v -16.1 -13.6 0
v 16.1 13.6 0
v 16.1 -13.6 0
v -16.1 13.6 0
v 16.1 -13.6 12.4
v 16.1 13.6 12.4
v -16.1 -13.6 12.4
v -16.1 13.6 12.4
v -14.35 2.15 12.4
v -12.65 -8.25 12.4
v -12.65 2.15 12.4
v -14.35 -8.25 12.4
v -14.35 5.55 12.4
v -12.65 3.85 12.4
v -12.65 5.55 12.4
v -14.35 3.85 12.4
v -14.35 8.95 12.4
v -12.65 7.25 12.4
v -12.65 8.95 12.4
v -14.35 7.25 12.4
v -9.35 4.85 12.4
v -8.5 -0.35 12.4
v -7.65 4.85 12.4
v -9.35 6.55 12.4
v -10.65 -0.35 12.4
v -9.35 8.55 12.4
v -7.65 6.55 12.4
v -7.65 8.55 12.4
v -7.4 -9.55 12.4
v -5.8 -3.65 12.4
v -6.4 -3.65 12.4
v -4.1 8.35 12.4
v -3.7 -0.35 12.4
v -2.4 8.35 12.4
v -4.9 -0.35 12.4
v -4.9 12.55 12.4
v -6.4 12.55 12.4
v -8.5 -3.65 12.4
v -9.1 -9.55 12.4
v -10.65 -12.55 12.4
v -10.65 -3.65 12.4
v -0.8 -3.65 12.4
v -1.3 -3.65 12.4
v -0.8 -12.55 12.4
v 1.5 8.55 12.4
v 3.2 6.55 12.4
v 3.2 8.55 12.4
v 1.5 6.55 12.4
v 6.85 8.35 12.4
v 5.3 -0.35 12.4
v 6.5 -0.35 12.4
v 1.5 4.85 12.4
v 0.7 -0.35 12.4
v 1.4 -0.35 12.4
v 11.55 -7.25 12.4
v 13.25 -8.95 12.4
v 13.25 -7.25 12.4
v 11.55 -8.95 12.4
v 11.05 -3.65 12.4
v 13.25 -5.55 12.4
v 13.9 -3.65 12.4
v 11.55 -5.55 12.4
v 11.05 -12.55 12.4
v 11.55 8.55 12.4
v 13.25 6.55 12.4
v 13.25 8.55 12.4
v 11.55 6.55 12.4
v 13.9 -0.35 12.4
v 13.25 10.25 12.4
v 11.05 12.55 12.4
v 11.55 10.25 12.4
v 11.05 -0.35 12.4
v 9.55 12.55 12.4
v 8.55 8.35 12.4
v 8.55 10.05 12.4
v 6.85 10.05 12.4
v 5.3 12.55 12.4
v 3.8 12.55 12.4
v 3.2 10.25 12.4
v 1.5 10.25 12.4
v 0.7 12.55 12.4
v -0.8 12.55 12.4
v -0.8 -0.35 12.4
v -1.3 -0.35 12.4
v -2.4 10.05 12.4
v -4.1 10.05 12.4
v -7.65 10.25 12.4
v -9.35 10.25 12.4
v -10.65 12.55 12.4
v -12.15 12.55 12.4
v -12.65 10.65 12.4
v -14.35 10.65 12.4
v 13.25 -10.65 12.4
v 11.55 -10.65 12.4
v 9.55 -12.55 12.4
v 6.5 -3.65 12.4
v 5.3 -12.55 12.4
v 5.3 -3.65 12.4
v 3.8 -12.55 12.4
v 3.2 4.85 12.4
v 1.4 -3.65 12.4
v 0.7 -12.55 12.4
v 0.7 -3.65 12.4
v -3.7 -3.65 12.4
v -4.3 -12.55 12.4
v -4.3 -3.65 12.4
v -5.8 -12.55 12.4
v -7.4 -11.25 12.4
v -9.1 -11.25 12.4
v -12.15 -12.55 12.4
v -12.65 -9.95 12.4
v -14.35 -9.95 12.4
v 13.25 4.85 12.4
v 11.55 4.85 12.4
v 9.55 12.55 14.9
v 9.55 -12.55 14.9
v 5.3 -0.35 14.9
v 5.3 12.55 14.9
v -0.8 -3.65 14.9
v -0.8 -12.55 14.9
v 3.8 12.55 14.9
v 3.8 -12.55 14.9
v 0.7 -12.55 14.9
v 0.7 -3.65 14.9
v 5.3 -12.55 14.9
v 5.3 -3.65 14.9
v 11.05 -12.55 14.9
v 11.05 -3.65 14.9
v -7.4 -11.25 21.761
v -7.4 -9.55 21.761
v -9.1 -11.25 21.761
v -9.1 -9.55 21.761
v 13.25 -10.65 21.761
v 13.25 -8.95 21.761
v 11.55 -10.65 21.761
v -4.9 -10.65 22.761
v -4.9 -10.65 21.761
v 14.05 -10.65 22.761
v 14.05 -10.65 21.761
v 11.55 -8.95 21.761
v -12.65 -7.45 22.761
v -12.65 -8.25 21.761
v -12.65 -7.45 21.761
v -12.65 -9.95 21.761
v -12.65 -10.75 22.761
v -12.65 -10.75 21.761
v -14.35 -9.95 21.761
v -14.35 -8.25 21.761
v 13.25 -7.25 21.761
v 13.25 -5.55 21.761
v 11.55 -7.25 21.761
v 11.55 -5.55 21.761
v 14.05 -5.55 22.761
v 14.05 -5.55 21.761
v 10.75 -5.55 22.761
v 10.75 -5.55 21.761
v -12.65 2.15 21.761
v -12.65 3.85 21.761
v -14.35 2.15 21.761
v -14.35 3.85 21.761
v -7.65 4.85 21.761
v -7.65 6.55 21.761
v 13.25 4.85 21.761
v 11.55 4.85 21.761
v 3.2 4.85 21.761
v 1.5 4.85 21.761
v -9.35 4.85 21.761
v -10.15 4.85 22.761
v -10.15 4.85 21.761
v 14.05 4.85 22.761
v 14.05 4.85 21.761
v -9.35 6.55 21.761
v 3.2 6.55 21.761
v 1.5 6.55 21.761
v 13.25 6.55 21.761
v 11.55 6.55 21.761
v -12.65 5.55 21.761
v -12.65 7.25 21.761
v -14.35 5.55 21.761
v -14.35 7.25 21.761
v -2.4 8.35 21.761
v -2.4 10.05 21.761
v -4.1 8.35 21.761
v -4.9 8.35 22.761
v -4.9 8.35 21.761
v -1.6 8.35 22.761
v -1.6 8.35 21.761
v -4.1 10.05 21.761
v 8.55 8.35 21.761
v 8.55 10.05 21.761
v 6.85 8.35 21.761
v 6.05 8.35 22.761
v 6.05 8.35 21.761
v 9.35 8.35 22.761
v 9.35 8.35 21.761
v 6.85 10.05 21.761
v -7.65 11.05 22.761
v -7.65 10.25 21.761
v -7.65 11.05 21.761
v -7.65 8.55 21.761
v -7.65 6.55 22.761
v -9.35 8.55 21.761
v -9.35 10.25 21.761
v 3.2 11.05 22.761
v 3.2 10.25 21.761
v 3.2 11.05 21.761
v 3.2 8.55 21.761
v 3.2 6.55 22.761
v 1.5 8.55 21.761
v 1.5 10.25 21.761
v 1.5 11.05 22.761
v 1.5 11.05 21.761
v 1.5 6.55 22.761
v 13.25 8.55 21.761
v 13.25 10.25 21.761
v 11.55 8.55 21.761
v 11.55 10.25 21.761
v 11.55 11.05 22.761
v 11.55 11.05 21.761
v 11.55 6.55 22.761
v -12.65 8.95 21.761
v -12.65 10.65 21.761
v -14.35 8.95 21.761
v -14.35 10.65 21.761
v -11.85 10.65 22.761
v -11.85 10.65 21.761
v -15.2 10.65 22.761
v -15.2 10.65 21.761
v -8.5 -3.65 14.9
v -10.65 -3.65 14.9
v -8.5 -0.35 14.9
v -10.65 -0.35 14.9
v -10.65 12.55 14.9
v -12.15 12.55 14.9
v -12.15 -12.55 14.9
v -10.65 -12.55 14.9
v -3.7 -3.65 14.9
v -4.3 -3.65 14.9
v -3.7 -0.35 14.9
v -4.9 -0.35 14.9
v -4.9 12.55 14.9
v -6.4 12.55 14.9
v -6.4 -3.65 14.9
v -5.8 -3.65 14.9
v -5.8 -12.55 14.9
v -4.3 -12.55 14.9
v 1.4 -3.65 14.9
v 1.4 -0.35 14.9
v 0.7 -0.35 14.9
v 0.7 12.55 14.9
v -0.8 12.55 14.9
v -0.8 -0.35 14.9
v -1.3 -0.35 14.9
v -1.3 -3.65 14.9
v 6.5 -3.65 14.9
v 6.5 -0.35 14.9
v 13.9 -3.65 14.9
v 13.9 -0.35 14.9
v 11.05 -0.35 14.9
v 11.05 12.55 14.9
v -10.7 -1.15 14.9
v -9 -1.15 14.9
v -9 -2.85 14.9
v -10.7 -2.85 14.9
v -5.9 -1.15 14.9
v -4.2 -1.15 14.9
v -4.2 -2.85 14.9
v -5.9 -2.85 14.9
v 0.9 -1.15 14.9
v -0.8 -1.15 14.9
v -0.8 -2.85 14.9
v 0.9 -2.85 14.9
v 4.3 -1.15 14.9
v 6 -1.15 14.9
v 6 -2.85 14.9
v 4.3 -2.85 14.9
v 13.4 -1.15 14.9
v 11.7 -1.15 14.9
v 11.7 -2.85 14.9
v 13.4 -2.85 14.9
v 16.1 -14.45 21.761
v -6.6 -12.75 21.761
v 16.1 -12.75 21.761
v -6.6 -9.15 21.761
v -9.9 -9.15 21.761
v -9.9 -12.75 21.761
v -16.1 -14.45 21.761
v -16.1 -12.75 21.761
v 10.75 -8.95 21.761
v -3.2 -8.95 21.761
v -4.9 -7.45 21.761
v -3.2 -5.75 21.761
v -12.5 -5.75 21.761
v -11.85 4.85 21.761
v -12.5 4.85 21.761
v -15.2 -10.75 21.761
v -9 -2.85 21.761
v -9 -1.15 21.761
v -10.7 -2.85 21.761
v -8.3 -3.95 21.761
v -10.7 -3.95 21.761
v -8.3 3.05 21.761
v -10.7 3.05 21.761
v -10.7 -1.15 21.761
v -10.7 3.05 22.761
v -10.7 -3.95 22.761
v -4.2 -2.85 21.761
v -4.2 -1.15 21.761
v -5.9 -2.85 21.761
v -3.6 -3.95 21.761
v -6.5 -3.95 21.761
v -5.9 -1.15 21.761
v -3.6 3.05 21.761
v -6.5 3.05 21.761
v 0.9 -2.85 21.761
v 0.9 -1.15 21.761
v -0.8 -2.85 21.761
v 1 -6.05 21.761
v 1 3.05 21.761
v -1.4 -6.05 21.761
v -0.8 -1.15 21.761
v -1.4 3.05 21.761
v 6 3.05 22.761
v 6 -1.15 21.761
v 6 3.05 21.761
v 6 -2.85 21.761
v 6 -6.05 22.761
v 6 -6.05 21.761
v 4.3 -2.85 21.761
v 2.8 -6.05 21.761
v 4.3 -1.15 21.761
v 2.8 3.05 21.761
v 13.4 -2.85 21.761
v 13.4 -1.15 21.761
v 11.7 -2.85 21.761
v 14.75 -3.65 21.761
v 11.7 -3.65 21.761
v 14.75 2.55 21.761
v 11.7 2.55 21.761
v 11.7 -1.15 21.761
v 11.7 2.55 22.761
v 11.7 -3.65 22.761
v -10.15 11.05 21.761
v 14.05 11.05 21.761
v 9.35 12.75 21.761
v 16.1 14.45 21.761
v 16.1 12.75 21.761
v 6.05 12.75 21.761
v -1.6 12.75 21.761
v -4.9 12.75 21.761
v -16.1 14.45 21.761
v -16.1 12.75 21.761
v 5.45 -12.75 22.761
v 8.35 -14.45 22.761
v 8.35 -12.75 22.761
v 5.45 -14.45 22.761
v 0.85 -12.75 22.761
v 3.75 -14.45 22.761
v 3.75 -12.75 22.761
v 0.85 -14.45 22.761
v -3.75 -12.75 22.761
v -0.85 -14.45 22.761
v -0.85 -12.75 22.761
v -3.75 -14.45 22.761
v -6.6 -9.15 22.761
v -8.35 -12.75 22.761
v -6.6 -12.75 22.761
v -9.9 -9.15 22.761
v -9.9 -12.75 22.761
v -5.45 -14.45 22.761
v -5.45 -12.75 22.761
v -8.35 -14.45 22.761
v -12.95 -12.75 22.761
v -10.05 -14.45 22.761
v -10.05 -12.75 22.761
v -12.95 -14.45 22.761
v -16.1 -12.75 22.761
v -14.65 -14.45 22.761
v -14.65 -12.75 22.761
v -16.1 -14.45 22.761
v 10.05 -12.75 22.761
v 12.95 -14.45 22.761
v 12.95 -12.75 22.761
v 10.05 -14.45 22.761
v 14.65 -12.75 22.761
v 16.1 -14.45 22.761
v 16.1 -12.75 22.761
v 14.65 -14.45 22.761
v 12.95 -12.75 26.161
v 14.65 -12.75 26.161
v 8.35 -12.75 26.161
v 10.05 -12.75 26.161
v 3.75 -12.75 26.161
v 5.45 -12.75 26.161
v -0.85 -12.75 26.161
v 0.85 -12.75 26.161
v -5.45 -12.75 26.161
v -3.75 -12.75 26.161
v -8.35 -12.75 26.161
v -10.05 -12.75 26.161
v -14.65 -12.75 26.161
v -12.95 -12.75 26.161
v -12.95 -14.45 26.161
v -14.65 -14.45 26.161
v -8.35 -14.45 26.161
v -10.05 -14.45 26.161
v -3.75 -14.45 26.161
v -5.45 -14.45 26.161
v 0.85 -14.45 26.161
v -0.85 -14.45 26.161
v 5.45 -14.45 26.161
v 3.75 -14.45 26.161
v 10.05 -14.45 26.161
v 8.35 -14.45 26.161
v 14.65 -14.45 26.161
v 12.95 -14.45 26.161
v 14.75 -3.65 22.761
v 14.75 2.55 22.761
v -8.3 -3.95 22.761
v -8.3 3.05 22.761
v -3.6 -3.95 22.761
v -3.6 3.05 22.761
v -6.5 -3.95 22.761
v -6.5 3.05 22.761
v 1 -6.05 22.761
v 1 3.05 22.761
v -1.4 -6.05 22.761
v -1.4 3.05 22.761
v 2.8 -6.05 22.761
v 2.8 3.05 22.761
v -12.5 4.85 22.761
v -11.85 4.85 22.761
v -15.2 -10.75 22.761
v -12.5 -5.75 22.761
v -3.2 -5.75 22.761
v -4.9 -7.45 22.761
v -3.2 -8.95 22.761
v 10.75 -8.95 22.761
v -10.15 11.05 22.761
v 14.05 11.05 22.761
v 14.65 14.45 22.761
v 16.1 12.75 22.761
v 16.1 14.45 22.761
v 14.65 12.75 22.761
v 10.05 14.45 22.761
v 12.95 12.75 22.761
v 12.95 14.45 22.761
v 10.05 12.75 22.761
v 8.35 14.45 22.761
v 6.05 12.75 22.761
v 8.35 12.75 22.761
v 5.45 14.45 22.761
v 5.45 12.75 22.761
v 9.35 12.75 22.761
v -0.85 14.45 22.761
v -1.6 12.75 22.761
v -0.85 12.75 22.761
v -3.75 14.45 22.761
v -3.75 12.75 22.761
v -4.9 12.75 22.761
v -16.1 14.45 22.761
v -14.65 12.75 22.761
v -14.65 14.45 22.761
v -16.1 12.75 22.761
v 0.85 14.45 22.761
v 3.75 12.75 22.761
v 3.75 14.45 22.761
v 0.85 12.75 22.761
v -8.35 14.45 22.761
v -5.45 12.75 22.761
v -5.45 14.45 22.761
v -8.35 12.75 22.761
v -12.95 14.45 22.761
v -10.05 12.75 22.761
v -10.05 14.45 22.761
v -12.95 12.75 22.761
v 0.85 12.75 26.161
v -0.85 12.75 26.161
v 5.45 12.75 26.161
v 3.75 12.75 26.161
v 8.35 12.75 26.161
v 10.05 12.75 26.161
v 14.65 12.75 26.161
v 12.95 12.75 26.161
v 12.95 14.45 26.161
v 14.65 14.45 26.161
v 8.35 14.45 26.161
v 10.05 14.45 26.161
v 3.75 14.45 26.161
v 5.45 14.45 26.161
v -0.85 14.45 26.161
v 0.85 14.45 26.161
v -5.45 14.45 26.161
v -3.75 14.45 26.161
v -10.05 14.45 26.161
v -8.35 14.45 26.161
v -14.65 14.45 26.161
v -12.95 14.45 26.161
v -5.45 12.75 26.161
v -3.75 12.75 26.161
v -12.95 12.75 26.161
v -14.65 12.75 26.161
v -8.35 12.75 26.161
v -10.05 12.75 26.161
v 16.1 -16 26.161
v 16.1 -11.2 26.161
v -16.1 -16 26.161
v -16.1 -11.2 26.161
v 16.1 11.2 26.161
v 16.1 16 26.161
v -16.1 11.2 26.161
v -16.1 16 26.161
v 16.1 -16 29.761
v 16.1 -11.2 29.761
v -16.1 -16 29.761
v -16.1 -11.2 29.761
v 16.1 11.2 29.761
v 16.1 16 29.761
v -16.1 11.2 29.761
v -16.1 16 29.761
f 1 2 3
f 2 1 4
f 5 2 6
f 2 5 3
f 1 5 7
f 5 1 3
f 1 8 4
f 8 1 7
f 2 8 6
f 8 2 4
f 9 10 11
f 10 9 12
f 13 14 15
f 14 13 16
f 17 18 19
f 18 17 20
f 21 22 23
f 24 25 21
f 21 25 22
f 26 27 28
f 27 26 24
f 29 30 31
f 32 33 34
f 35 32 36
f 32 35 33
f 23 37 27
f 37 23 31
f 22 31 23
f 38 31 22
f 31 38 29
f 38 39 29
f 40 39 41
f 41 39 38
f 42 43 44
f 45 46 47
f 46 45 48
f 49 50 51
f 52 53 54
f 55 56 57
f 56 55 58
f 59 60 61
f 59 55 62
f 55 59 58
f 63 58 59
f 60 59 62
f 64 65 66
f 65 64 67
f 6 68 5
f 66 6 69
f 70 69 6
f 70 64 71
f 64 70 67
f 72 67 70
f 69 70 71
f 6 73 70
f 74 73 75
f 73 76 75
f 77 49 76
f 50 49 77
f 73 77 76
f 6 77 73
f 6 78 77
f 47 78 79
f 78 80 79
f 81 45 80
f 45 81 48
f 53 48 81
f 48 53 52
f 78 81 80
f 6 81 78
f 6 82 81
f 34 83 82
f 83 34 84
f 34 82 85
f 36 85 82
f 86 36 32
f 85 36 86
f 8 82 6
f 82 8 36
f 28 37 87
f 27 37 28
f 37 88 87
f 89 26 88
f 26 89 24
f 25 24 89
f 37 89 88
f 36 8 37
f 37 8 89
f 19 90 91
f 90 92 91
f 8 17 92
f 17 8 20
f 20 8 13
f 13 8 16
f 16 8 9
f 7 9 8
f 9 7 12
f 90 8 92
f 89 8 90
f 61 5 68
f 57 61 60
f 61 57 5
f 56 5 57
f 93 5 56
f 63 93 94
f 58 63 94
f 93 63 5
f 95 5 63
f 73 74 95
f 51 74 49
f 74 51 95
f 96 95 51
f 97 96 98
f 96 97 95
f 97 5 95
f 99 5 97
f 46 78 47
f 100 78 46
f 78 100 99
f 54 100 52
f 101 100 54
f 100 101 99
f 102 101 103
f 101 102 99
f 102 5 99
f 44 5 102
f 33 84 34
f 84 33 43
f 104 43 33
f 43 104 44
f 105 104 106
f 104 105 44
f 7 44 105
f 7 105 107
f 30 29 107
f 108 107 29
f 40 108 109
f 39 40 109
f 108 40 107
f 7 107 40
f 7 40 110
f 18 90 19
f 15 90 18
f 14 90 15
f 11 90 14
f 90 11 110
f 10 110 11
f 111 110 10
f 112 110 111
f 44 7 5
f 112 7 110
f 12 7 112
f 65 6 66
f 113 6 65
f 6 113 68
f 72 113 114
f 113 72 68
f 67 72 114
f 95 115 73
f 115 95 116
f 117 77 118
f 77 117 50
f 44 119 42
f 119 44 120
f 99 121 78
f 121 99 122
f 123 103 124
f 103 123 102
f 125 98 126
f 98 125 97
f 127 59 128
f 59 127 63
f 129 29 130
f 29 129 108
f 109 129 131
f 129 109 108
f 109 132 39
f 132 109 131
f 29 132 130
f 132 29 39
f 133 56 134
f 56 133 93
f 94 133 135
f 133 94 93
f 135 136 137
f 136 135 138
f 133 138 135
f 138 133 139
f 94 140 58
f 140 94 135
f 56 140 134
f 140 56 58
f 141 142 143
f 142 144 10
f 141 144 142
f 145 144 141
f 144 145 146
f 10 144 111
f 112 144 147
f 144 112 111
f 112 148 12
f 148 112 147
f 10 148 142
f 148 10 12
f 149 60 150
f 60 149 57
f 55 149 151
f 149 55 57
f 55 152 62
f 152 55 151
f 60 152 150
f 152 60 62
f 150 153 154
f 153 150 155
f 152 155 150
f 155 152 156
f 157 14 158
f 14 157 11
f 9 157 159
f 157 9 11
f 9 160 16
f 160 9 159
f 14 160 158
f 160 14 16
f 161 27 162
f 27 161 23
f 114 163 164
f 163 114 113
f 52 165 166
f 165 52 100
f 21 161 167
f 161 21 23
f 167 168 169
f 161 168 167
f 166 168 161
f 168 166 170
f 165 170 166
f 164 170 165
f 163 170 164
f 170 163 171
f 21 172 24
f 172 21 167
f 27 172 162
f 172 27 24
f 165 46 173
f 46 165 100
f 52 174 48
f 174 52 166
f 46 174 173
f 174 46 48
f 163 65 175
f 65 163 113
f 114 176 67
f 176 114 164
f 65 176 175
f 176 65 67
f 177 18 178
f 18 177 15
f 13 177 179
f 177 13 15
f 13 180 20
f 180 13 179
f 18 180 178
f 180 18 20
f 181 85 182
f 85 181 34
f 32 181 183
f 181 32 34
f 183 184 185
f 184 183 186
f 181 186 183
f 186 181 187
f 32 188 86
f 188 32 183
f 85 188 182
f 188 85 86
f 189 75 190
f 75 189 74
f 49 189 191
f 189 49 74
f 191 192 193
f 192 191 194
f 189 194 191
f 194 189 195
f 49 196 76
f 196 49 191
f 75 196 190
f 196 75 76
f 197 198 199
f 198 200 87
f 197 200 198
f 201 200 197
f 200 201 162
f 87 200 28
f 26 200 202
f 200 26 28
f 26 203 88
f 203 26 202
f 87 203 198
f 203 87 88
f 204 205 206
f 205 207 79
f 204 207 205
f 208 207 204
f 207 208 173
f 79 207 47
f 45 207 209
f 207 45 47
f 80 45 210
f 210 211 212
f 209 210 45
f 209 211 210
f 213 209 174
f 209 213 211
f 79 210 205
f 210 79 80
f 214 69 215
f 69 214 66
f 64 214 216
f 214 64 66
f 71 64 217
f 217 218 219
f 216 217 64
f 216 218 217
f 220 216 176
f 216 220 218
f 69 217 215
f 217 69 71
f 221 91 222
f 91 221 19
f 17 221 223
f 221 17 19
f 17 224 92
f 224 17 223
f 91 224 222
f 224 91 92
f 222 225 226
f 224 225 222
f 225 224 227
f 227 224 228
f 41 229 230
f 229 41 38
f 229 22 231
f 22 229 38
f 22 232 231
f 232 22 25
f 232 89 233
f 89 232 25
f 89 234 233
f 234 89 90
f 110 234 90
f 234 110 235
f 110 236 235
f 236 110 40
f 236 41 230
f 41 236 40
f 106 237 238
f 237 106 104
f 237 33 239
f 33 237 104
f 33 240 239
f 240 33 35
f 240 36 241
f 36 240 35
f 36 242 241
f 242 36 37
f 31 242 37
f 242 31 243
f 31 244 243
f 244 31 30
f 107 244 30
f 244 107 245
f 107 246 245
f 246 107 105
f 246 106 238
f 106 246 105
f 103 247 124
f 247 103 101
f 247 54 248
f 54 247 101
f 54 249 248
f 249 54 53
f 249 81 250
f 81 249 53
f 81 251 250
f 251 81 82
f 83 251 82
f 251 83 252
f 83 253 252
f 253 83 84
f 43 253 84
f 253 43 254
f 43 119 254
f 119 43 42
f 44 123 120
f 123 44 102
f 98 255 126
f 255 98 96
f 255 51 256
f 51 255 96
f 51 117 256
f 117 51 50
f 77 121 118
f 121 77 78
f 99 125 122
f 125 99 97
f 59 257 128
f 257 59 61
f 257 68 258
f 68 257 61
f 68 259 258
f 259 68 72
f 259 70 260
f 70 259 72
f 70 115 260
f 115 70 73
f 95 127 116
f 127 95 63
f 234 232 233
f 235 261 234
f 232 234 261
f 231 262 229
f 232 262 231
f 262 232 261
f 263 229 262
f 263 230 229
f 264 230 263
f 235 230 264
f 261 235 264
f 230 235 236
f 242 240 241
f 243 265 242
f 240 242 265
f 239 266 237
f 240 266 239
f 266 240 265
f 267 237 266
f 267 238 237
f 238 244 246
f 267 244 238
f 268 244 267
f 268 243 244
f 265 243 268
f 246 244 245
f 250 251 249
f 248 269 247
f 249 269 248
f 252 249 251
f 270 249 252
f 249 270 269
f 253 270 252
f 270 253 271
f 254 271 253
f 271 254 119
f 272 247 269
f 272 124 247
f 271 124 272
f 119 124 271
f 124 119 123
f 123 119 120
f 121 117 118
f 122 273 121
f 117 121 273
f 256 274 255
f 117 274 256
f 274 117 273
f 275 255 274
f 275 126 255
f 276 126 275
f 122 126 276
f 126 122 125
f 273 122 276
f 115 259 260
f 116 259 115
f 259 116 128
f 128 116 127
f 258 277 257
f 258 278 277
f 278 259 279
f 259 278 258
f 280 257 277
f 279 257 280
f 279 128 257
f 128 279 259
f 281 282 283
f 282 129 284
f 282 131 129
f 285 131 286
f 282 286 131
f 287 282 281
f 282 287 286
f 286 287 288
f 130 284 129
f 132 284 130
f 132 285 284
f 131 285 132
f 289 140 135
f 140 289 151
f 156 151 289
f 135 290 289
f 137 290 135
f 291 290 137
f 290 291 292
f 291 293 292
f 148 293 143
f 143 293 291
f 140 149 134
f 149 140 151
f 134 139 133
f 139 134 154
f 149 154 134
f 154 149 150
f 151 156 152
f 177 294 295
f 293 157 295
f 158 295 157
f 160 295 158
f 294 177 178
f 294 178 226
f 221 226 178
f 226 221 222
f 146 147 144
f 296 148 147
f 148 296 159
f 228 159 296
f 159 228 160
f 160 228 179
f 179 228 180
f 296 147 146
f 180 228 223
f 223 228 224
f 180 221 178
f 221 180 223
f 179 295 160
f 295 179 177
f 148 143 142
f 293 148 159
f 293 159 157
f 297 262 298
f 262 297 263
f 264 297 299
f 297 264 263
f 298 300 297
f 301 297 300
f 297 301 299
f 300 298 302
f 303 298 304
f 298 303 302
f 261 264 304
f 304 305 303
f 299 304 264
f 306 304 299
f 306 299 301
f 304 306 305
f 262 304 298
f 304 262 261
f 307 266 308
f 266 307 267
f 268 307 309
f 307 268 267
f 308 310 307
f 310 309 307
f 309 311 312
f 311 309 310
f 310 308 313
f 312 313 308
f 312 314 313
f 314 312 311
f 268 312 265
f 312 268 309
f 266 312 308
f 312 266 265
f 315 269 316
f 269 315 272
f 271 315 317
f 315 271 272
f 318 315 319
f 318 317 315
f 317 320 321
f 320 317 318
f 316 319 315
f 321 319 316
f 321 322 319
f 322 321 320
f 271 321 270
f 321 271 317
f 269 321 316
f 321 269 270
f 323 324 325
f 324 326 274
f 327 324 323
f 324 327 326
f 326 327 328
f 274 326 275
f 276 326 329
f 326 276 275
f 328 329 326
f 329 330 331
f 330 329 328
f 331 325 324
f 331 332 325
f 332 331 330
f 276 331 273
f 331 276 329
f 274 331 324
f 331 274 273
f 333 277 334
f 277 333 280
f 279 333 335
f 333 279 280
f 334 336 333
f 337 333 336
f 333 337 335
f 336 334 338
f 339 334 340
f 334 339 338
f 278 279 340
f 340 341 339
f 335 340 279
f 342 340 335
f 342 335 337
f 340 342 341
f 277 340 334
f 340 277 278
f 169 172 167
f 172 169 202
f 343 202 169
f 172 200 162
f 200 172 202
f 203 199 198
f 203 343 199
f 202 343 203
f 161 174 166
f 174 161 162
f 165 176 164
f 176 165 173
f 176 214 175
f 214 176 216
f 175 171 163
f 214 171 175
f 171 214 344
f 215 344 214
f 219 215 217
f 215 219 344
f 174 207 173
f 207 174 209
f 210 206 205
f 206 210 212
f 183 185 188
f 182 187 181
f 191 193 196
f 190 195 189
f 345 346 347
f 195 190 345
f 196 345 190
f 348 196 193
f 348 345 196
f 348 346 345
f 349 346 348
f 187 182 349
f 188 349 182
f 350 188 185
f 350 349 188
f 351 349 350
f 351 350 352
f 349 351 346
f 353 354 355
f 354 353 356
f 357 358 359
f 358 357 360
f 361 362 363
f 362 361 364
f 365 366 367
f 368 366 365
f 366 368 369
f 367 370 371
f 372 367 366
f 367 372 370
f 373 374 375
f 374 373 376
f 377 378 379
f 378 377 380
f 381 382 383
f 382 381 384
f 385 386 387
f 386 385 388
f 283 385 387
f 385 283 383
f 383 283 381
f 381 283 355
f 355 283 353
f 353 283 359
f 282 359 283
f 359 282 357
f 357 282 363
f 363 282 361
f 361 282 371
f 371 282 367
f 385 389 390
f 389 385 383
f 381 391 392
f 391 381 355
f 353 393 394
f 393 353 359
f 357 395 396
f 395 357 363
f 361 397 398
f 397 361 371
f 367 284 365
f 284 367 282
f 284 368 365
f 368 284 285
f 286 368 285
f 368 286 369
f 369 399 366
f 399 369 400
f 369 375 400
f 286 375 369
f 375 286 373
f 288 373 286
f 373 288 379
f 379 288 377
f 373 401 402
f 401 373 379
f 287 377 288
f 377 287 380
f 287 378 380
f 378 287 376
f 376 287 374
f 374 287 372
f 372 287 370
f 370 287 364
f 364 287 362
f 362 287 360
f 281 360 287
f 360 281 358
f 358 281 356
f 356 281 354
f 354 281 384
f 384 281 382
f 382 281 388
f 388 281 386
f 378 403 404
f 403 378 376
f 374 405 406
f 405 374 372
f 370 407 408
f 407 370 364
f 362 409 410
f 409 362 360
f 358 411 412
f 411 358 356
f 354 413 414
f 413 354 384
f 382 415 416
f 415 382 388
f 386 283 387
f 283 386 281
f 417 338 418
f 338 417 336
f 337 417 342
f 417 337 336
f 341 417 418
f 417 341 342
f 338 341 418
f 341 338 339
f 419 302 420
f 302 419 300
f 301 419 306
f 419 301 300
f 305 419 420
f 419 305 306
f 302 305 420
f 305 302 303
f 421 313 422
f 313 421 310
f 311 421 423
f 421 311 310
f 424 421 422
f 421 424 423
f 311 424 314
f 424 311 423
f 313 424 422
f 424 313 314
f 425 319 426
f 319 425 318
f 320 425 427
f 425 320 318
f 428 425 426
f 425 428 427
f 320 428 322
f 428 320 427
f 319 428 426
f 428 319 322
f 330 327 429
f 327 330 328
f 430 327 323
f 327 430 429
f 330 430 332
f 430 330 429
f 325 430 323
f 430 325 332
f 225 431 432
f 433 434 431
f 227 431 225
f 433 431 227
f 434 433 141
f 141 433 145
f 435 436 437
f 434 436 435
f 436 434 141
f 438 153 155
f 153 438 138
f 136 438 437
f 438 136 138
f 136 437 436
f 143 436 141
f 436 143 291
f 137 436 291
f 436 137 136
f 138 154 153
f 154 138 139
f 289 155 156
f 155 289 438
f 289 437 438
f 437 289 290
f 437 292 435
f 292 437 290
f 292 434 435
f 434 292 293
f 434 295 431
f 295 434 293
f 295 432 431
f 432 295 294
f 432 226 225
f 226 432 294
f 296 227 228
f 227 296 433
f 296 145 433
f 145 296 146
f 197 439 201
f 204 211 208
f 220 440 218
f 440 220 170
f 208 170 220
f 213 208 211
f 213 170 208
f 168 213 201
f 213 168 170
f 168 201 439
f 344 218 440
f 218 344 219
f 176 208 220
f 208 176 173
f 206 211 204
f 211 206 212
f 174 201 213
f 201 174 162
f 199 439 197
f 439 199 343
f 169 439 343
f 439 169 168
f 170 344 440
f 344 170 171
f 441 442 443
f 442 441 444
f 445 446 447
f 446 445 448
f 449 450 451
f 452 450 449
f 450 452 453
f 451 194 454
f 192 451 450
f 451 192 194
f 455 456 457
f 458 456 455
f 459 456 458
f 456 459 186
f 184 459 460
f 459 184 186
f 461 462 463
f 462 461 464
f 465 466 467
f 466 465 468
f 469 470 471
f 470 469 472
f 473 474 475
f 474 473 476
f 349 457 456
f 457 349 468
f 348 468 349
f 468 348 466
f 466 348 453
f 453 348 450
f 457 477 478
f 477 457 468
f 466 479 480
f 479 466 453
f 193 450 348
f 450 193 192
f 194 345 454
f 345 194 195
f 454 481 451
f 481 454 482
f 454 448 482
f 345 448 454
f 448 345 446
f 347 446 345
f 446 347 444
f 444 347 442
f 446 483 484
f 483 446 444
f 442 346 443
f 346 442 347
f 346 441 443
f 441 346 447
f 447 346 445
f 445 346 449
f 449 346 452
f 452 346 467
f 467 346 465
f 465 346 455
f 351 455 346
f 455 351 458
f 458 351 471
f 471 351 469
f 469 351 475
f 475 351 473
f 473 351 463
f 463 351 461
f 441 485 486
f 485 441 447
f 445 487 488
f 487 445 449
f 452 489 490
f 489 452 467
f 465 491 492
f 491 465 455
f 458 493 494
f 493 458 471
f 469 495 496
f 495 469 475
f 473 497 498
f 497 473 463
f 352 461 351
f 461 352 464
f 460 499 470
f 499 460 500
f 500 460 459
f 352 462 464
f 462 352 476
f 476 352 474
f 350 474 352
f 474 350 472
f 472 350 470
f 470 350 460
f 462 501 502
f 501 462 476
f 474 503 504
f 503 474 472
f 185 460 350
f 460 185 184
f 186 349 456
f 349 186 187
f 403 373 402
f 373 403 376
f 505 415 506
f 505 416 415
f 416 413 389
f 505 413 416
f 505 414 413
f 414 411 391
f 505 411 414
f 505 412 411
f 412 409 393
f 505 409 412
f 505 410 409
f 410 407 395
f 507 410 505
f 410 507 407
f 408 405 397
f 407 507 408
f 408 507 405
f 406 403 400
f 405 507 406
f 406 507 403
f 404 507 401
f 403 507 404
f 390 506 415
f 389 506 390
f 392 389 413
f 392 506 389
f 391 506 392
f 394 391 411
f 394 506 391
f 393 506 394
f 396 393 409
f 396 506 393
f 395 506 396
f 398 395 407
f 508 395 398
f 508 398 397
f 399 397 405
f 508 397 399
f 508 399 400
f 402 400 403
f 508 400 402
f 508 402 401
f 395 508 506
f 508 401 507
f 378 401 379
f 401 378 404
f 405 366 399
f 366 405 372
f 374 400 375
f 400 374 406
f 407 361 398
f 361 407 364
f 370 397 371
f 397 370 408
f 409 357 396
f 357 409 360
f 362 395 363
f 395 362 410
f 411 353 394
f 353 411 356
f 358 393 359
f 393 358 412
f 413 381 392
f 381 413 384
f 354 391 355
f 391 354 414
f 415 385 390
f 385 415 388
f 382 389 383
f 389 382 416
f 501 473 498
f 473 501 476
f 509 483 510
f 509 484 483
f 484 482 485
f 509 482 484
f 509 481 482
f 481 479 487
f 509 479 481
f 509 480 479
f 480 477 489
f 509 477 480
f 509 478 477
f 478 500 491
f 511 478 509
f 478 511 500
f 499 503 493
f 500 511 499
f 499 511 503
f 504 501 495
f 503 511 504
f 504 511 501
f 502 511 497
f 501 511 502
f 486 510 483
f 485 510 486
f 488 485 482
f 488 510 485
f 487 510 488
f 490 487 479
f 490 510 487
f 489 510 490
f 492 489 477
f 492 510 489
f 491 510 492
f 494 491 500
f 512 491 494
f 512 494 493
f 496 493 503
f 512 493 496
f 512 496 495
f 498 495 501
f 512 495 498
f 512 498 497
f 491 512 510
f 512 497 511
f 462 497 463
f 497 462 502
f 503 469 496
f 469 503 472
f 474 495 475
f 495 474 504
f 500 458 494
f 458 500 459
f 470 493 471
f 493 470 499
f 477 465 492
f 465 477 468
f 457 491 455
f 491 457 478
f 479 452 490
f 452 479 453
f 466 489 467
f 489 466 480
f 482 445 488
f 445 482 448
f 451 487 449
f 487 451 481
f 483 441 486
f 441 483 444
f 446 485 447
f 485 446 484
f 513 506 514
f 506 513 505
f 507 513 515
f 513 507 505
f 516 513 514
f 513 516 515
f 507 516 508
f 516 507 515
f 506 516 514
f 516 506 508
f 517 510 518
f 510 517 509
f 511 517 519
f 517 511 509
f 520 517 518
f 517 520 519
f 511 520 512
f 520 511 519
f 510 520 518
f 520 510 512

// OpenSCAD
// Generated by SolidPython 0.4.2 on 2020-09-29 23:20:01
//!OpenSCAD

scale(v = 0.0100000000) {
	translate(v = [-1610, -1360, 0]) {
		union() {
			color(c = [0.4000000000, 0.4000000000, 0.4000000000]) {
				translate(v = [0, 0, 0]) {
					linear_extrude(height = 1000.0000000000) {
						polygon(paths = [[0, 1, 2, 3]], points = [[0, 0], [0, 2720], [3220, 2720], [3220, 0]]);
					}
				}
			}
			color(c = [0.2000000000, 0.6000000000, 0.2000000000]) {
				translate(v = [0, 0, 1000.0000000000]) {
					linear_extrude(height = 120.0000000000) {
						polygon(paths = [[0, 1, 2, 3]], points = [[0, 1305], [0, 2720], [3220, 2720], [3220, 1305]]);
					}
				}
			}
			color(c = [0.4000000000, 0.4000000000, 0.4000000000]) {
				translate(v = [0, 0, 1000.0000000000]) {
					linear_extrude(height = 120.0000000000) {
						polygon(paths = [[0, 1, 2, 3]], points = [[0, 0], [0, 1305], [3220, 1305], [3220, 0]]);
					}
				}
			}
			color(c = [0.9000000000, 0.6000000000, 0.6000000000]) {
				translate(v = [0, 0, 1120.0000000000]) {
					linear_extrude(height = 120.0000000000) {
						polygon(paths = [[0, 1, 2, 3]], points = [[135, 1485], [135, 2485], [395, 2485], [395, 1485]]);
					}
				}
			}
			color(c = [0.9000000000, 0.6000000000, 0.6000000000]) {
				translate(v = [0, 0, 1120.0000000000]) {
					linear_extrude(height = 120.0000000000) {
						polygon(paths = [[0, 1, 2, 3]], points = [[545, 1485], [545, 2485], [970, 2485], [970, 1485]]);
					}
				}
			}
			color(c = [0.9000000000, 0.6000000000, 0.6000000000]) {
				translate(v = [0, 0, 1120.0000000000]) {
					linear_extrude(height = 120.0000000000) {
						polygon(paths = [[0, 1, 2, 3]], points = [[1120, 1485], [1120, 2485], [1530, 2485], [1530, 1485]]);
					}
				}
			}
			color(c = [0.9000000000, 0.6000000000, 0.6000000000]) {
				translate(v = [0, 0, 1120.0000000000]) {
					linear_extrude(height = 120.0000000000) {
						polygon(paths = [[0, 1, 2, 3]], points = [[1680, 1485], [1680, 2485], [1990, 2485], [1990, 1485]]);
					}
				}
			}
			color(c = [0.9000000000, 0.6000000000, 0.6000000000]) {
				translate(v = [0, 0, 1120.0000000000]) {
					linear_extrude(height = 120.0000000000) {
						polygon(paths = [[0, 1, 2, 3]], points = [[2140, 1485], [2140, 2485], [2565, 2485], [2565, 1485]]);
					}
				}
			}
			color(c = [0.9000000000, 0.6000000000, 0.6000000000]) {
				translate(v = [0, 0, 1120.0000000000]) {
					linear_extrude(height = 120.0000000000) {
						polygon(paths = [[0, 1, 2, 3]], points = [[2715, 1485], [2715, 2485], [3085, 2485], [3085, 1485]]);
					}
				}
			}
			color(c = [0.9000000000, 0.6000000000, 0.9000000000]) {
				translate(v = [0, 0, 1120.0000000000]) {
					linear_extrude(height = 120.0000000000) {
						polygon(paths = [[0, 1, 2, 3]], points = [[135, 235], [135, 885], [395, 885], [395, 235]]);
					}
				}
			}
			color(c = [0.9000000000, 0.6000000000, 0.9000000000]) {
				translate(v = [0, 0, 1120.0000000000]) {
					linear_extrude(height = 120.0000000000) {
						polygon(paths = [[0, 1, 2, 3, 4, 5, 6, 7]], points = [[640, 195], [640, 235], [545, 235], [545, 885], [1030, 885], [1030, 235], [930, 235], [930, 195]]);
					}
				}
			}
			color(c = [0.9000000000, 0.6000000000, 0.9000000000]) {
				translate(v = [0, 0, 1120.0000000000]) {
					linear_extrude(height = 120.0000000000) {
						polygon(paths = [[0, 1, 2, 3]], points = [[1180, 235], [1180, 885], [1530, 885], [1530, 235]]);
					}
				}
			}
			color(c = [0.9000000000, 0.6000000000, 0.9000000000]) {
				translate(v = [0, 0, 1120.0000000000]) {
					linear_extrude(height = 120.0000000000) {
						polygon(paths = [[0, 1, 2, 3]], points = [[1680, 235], [1680, 885], [1990, 885], [1990, 235]]);
					}
				}
			}
			color(c = [0.9000000000, 0.6000000000, 0.9000000000]) {
				translate(v = [0, 0, 1120.0000000000]) {
					linear_extrude(height = 120.0000000000) {
						polygon(paths = [[0, 1, 2, 3]], points = [[2140, 235], [2140, 885], [2565, 885], [2565, 235]]);
					}
				}
			}
			color(c = [0.9000000000, 0.6000000000, 0.9000000000]) {
				translate(v = [0, 0, 1120.0000000000]) {
					linear_extrude(height = 120.0000000000) {
						polygon(paths = [[0, 1, 2, 3]], points = [[2715, 235], [2715, 885], [3085, 885], [3085, 235]]);
					}
				}
			}
			color(c = [0.2000000000, 0.6000000000, 0.2000000000]) {
				translate(v = [0, 0, 1120.0000000000]) {
					linear_extrude(height = 120.0000000000) {
						difference() {
							polygon(paths = [[0, 1, 2, 3]], points = [[0, 1305], [0, 2720], [3220, 2720], [3220, 1305]]);
							polygon(paths = [[0, 1, 2, 3]], points = [[135, 1485], [395, 1485], [395, 2485], [135, 2485]]);
							polygon(paths = [[0, 1, 2, 3]], points = [[545, 1485], [970, 1485], [970, 2485], [545, 2485]]);
							polygon(paths = [[0, 1, 2, 3]], points = [[1120, 1485], [1530, 1485], [1530, 2485], [1120, 2485]]);
							polygon(paths = [[0, 1, 2, 3]], points = [[1680, 1485], [1990, 1485], [1990, 2485], [1680, 2485]]);
							polygon(paths = [[0, 1, 2, 3]], points = [[2140, 1485], [2565, 1485], [2565, 2485], [2140, 2485]]);
							polygon(paths = [[0, 1, 2, 3]], points = [[2715, 1485], [3085, 1485], [3085, 2485], [2715, 2485]]);
						}
					}
				}
			}
			color(c = [0.4000000000, 0.4000000000, 0.4000000000]) {
				translate(v = [0, 0, 1120.0000000000]) {
					linear_extrude(height = 120.0000000000) {
						difference() {
							polygon(paths = [[0, 1, 2, 3]], points = [[0, 0], [0, 1305], [3220, 1305], [3220, 0]]);
							polygon(paths = [[0, 1, 2, 3]], points = [[135, 235], [395, 235], [395, 885], [135, 885]]);
							polygon(paths = [[0, 1, 2, 3]], points = [[1180, 235], [1530, 235], [1530, 885], [1180, 885]]);
							polygon(paths = [[0, 1, 2, 3]], points = [[1680, 235], [1990, 235], [1990, 885], [1680, 885]]);
							polygon(paths = [[0, 1, 2, 3]], points = [[2140, 235], [2565, 235], [2565, 885], [2140, 885]]);
							polygon(paths = [[0, 1, 2, 3]], points = [[2715, 235], [3085, 235], [3085, 885], [2715, 885]]);
							polygon(paths = [[0, 1, 2, 3, 4, 5, 6, 7]], points = [[640, 195], [930, 195], [930, 235], [1030, 235], [1030, 885], [545, 885], [545, 235], [640, 235]]);
						}
					}
				}
			}
			color(c = [0.1000000000, 0.1000000000, 0.1000000000]) {
				translate(v = [0, 0, 1240.0000000000]) {
					linear_extrude(height = 70.0000000000) {
						polygon(paths = [[0, 1, 2, 3]], points = [[700, 235], [700, 405], [870, 405], [870, 235]]);
					}
				}
			}
			color(c = [0.1000000000, 0.1000000000, 0.1000000000]) {
				translate(v = [0, 0, 1240.0000000000]) {
					linear_extrude(height = 70.0000000000) {
						polygon(paths = [[0, 1, 2, 3]], points = [[2765, 295], [2765, 465], [2935, 465], [2935, 295]]);
					}
				}
			}
			color(c = [0.1000000000, 0.1000000000, 0.1000000000]) {
				translate(v = [0, 0, 1240.0000000000]) {
					linear_extrude(height = 70.0000000000) {
						polygon(paths = [[0, 1, 2, 3]], points = [[175, 365], [175, 535], [345, 535], [345, 365]]);
					}
				}
			}
			color(c = [0.1000000000, 0.1000000000, 0.1000000000]) {
				translate(v = [0, 0, 1240.0000000000]) {
					linear_extrude(height = 70.0000000000) {
						polygon(paths = [[0, 1, 2, 3]], points = [[2765, 635], [2765, 805], [2935, 805], [2935, 635]]);
					}
				}
			}
			color(c = [0.1000000000, 0.1000000000, 0.1000000000]) {
				translate(v = [0, 0, 1240.0000000000]) {
					linear_extrude(height = 70.0000000000) {
						polygon(paths = [[0, 1, 2, 3]], points = [[175, 1575], [175, 1745], [345, 1745], [345, 1575]]);
					}
				}
			}
			color(c = [0.1000000000, 0.1000000000, 0.1000000000]) {
				translate(v = [0, 0, 1240.0000000000]) {
					linear_extrude(height = 70.0000000000) {
						polygon(paths = [[0, 1, 2, 3]], points = [[675, 1845], [675, 2015], [845, 2015], [845, 1845]]);
					}
				}
			}
			color(c = [0.1000000000, 0.1000000000, 0.1000000000]) {
				translate(v = [0, 0, 1240.0000000000]) {
					linear_extrude(height = 70.0000000000) {
						polygon(paths = [[0, 1, 2, 3]], points = [[1760, 1845], [1760, 2015], [1930, 2015], [1930, 1845]]);
					}
				}
			}
			color(c = [0.1000000000, 0.1000000000, 0.1000000000]) {
				translate(v = [0, 0, 1240.0000000000]) {
					linear_extrude(height = 70.0000000000) {
						polygon(paths = [[0, 1, 2, 3]], points = [[2765, 1845], [2765, 2015], [2935, 2015], [2935, 1845]]);
					}
				}
			}
			color(c = [0.1000000000, 0.1000000000, 0.1000000000]) {
				translate(v = [0, 0, 1240.0000000000]) {
					linear_extrude(height = 70.0000000000) {
						polygon(paths = [[0, 1, 2, 3]], points = [[175, 1915], [175, 2085], [345, 2085], [345, 1915]]);
					}
				}
			}
			color(c = [0.1000000000, 0.1000000000, 0.1000000000]) {
				translate(v = [0, 0, 1240.0000000000]) {
					linear_extrude(height = 70.0000000000) {
						polygon(paths = [[0, 1, 2, 3]], points = [[1200, 2195], [1200, 2365], [1370, 2365], [1370, 2195]]);
					}
				}
			}
			color(c = [0.1000000000, 0.1000000000, 0.1000000000]) {
				translate(v = [0, 0, 1240.0000000000]) {
					linear_extrude(height = 70.0000000000) {
						polygon(paths = [[0, 1, 2, 3]], points = [[2295, 2195], [2295, 2365], [2465, 2365], [2465, 2195]]);
					}
				}
			}
			color(c = [0.1000000000, 0.1000000000, 0.1000000000]) {
				translate(v = [0, 0, 1240.0000000000]) {
					linear_extrude(height = 70.0000000000) {
						polygon(paths = [[0, 1, 2, 3]], points = [[675, 2215], [675, 2385], [845, 2385], [845, 2215]]);
					}
				}
			}
			color(c = [0.1000000000, 0.1000000000, 0.1000000000]) {
				translate(v = [0, 0, 1240.0000000000]) {
					linear_extrude(height = 70.0000000000) {
						polygon(paths = [[0, 1, 2, 3]], points = [[1760, 2215], [1760, 2385], [1930, 2385], [1930, 2215]]);
					}
				}
			}
			color(c = [0.1000000000, 0.1000000000, 0.1000000000]) {
				translate(v = [0, 0, 1240.0000000000]) {
					linear_extrude(height = 70.0000000000) {
						polygon(paths = [[0, 1, 2, 3]], points = [[2765, 2215], [2765, 2385], [2935, 2385], [2935, 2215]]);
					}
				}
			}
			color(c = [0.1000000000, 0.1000000000, 0.1000000000]) {
				translate(v = [0, 0, 1240.0000000000]) {
					linear_extrude(height = 70.0000000000) {
						polygon(paths = [[0, 1, 2, 3]], points = [[175, 2255], [175, 2425], [345, 2425], [345, 2255]]);
					}
				}
			}
			color(c = [1.0000000000, 1.0000000000, 1.0000000000]) {
				translate(v = [0, 0, 1240.0000000000]) {
					linear_extrude(height = 70.0000000000) {
						polygon(paths = [[0, 1, 2, 3, 4, 5, 6, 7]], points = [[395, 105], [395, 2615], [545, 2615], [545, 1325], [760, 1325], [760, 995], [545, 995], [545, 105]]);
					}
				}
			}
			color(c = [1.0000000000, 1.0000000000, 1.0000000000]) {
				translate(v = [0, 0, 1240.0000000000]) {
					linear_extrude(height = 70.0000000000) {
						polygon(paths = [[0, 1, 2, 3, 4, 5, 6, 7, 8, 9]], points = [[1030, 105], [1030, 995], [970, 995], [970, 2615], [1120, 2615], [1120, 1325], [1240, 1325], [1240, 995], [1180, 995], [1180, 105]]);
					}
				}
			}
			color(c = [1.0000000000, 1.0000000000, 1.0000000000]) {
				translate(v = [0, 0, 1240.0000000000]) {
					linear_extrude(height = 70.0000000000) {
						polygon(paths = [[0, 1, 2, 3, 4, 5, 6, 7, 8, 9, 10, 11]], points = [[1530, 105], [1530, 995], [1480, 995], [1480, 1325], [1530, 1325], [1530, 2615], [1680, 2615], [1680, 1325], [1750, 1325], [1750, 995], [1680, 995], [1680, 105]]);
					}
				}
			}
			color(c = [1.0000000000, 1.0000000000, 1.0000000000]) {
				translate(v = [0, 0, 1240.0000000000]) {
					linear_extrude(height = 70.0000000000) {
						polygon(paths = [[0, 1, 2, 3, 4, 5, 6, 7]], points = [[1990, 105], [1990, 2615], [2140, 2615], [2140, 1325], [2260, 1325], [2260, 995], [2140, 995], [2140, 105]]);
					}
				}
			}
			color(c = [1.0000000000, 1.0000000000, 1.0000000000]) {
				translate(v = [0, 0, 1240.0000000000]) {
					linear_extrude(height = 70.0000000000) {
						polygon(paths = [[0, 1, 2, 3, 4, 5, 6, 7]], points = [[2565, 105], [2565, 2615], [2715, 2615], [2715, 1325], [3000, 1325], [3000, 995], [2715, 995], [2715, 105]]);
					}
				}
			}
			color(c = [0.1000000000, 0.1000000000, 0.1000000000]) {
				translate(v = [0, 0, 1310.0000000000]) {
					linear_extrude(height = 180.0000000000) {
						polygon(paths = [[0, 1, 2, 3]], points = [[700, 235], [700, 405], [870, 405], [870, 235]]);
					}
				}
			}
			color(c = [0.1000000000, 0.1000000000, 0.1000000000]) {
				translate(v = [0, 0, 1310.0000000000]) {
					linear_extrude(height = 180.0000000000) {
						polygon(paths = [[0, 1, 2, 3]], points = [[2765, 295], [2765, 465], [2935, 465], [2935, 295]]);
					}
				}
			}
			color(c = [0.1000000000, 0.1000000000, 0.1000000000]) {
				translate(v = [0, 0, 1310.0000000000]) {
					linear_extrude(height = 180.0000000000) {
						polygon(paths = [[0, 1, 2, 3]], points = [[175, 365], [175, 535], [345, 535], [345, 365]]);
					}
				}
			}
			color(c = [0.1000000000, 0.1000000000, 0.1000000000]) {
				translate(v = [0, 0, 1310.0000000000]) {
					linear_extrude(height = 180.0000000000) {
						polygon(paths = [[0, 1, 2, 3]], points = [[2765, 635], [2765, 805], [2935, 805], [2935, 635]]);
					}
				}
			}
			color(c = [0.1000000000, 0.1000000000, 0.1000000000]) {
				translate(v = [0, 0, 1310.0000000000]) {
					linear_extrude(height = 180.0000000000) {
						polygon(paths = [[0, 1, 2, 3]], points = [[175, 1575], [175, 1745], [345, 1745], [345, 1575]]);
					}
				}
			}
			color(c = [0.1000000000, 0.1000000000, 0.1000000000]) {
				translate(v = [0, 0, 1310.0000000000]) {
					linear_extrude(height = 180.0000000000) {
						polygon(paths = [[0, 1, 2, 3]], points = [[675, 1845], [675, 2015], [845, 2015], [845, 1845]]);
					}
				}
			}
			color(c = [0.1000000000, 0.1000000000, 0.1000000000]) {
				translate(v = [0, 0, 1310.0000000000]) {
					linear_extrude(height = 180.0000000000) {
						polygon(paths = [[0, 1, 2, 3]], points = [[1760, 1845], [1760, 2015], [1930, 2015], [1930, 1845]]);
					}
				}
			}
			color(c = [0.1000000000, 0.1000000000, 0.1000000000]) {
				translate(v = [0, 0, 1310.0000000000]) {
					linear_extrude(height = 180.0000000000) {
						polygon(paths = [[0, 1, 2, 3]], points = [[2765, 1845], [2765, 2015], [2935, 2015], [2935, 1845]]);
					}
				}
			}
			color(c = [0.1000000000, 0.1000000000, 0.1000000000]) {
				translate(v = [0, 0, 1310.0000000000]) {
					linear_extrude(height = 180.0000000000) {
						polygon(paths = [[0, 1, 2, 3]], points = [[175, 1915], [175, 2085], [345, 2085], [345, 1915]]);
					}
				}
			}
			color(c = [0.1000000000, 0.1000000000, 0.1000000000]) {
				translate(v = [0, 0, 1310.0000000000]) {
					linear_extrude(height = 180.0000000000) {
						polygon(paths = [[0, 1, 2, 3]], points = [[1200, 2195], [1200, 2365], [1370, 2365], [1370, 2195]]);
					}
				}
			}
			color(c = [0.1000000000, 0.1000000000, 0.1000000000]) {
				translate(v = [0, 0, 1310.0000000000]) {
					linear_extrude(height = 180.0000000000) {
						polygon(paths = [[0, 1, 2, 3]], points = [[2295, 2195], [2295, 2365], [2465, 2365], [2465, 2195]]);
					}
				}
			}
			color(c = [0.1000000000, 0.1000000000, 0.1000000000]) {
				translate(v = [0, 0, 1310.0000000000]) {
					linear_extrude(height = 180.0000000000) {
						polygon(paths = [[0, 1, 2, 3]], points = [[675, 2215], [675, 2385], [845, 2385], [845, 2215]]);
					}
				}
			}
			color(c = [0.1000000000, 0.1000000000, 0.1000000000]) {
				translate(v = [0, 0, 1310.0000000000]) {
					linear_extrude(height = 180.0000000000) {
						polygon(paths = [[0, 1, 2, 3]], points = [[1760, 2215], [1760, 2385], [1930, 2385], [1930, 2215]]);
					}
				}
			}
			color(c = [0.1000000000, 0.1000000000, 0.1000000000]) {
				translate(v = [0, 0, 1310.0000000000]) {
					linear_extrude(height = 180.0000000000) {
						polygon(paths = [[0, 1, 2, 3]], points = [[2765, 2215], [2765, 2385], [2935, 2385], [2935, 2215]]);
					}
				}
			}
			color(c = [0.1000000000, 0.1000000000, 0.1000000000]) {
				translate(v = [0, 0, 1310.0000000000]) {
					linear_extrude(height = 180.0000000000) {
						polygon(paths = [[0, 1, 2, 3]], points = [[175, 2255], [175, 2425], [345, 2425], [345, 2255]]);
					}
				}
			}
			color(c = [0.7000000000, 0, 0]) {
				translate(v = [0, 0, 1310.0000000000]) {
					linear_extrude(height = 180.0000000000) {
						polygon(paths = [[0, 1, 2, 3, 4, 5, 6, 7]], points = [[395, 105], [395, 2615], [545, 2615], [545, 1325], [760, 1325], [760, 995], [545, 995], [545, 105]]);
					}
				}
			}
			color(c = [0.7000000000, 0, 0]) {
				translate(v = [0, 0, 1310.0000000000]) {
					linear_extrude(height = 180.0000000000) {
						polygon(paths = [[0, 1, 2, 3, 4, 5, 6, 7, 8, 9]], points = [[1030, 105], [1030, 995], [970, 995], [970, 2615], [1120, 2615], [1120, 1325], [1240, 1325], [1240, 995], [1180, 995], [1180, 105]]);
					}
				}
			}
			color(c = [0.7000000000, 0, 0]) {
				translate(v = [0, 0, 1310.0000000000]) {
					linear_extrude(height = 180.0000000000) {
						polygon(paths = [[0, 1, 2, 3, 4, 5, 6, 7, 8, 9, 10, 11]], points = [[1530, 105], [1530, 995], [1480, 995], [1480, 1325], [1530, 1325], [1530, 2615], [1680, 2615], [1680, 1325], [1750, 1325], [1750, 995], [1680, 995], [1680, 105]]);
					}
				}
			}
			color(c = [0.7000000000, 0, 0]) {
				translate(v = [0, 0, 1310.0000000000]) {
					linear_extrude(height = 180.0000000000) {
						polygon(paths = [[0, 1, 2, 3, 4, 5, 6, 7]], points = [[1990, 105], [1990, 2615], [2140, 2615], [2140, 1325], [2260, 1325], [2260, 995], [2140, 995], [2140, 105]]);
					}
				}
			}
			color(c = [0.7000000000, 0, 0]) {
				translate(v = [0, 0, 1310.0000000000]) {
					linear_extrude(height = 180.0000000000) {
						polygon(paths = [[0, 1, 2, 3, 4, 5, 6, 7]], points = [[2565, 105], [2565, 2615], [2715, 2615], [2715, 1325], [3000, 1325], [3000, 995], [2715, 995], [2715, 105]]);
					}
				}
			}
			color(c = [0.1000000000, 0.1000000000, 0.1000000000]) {
				translate(v = [0, 0, 1490.0000000000]) {
					linear_extrude(height = 686.1000000000) {
						polygon(paths = [[0, 1, 2, 3]], points = [[700, 235], [700, 405], [870, 405], [870, 235]]);
					}
				}
			}
			color(c = [0.1000000000, 0.1000000000, 0.1000000000]) {
				translate(v = [0, 0, 1490.0000000000]) {
					linear_extrude(height = 686.1000000000) {
						polygon(paths = [[0, 1, 2, 3]], points = [[2765, 295], [2765, 465], [2935, 465], [2935, 295]]);
					}
				}
			}
			color(c = [0.1000000000, 0.1000000000, 0.1000000000]) {
				translate(v = [0, 0, 1490.0000000000]) {
					linear_extrude(height = 686.1000000000) {
						polygon(paths = [[0, 1, 2, 3]], points = [[175, 365], [175, 535], [345, 535], [345, 365]]);
					}
				}
			}
			color(c = [0.1000000000, 0.1000000000, 0.1000000000]) {
				translate(v = [0, 0, 1490.0000000000]) {
					linear_extrude(height = 686.1000000000) {
						polygon(paths = [[0, 1, 2, 3]], points = [[2765, 635], [2765, 805], [2935, 805], [2935, 635]]);
					}
				}
			}
			color(c = [0.1000000000, 0.1000000000, 0.1000000000]) {
				translate(v = [0, 0, 1490.0000000000]) {
					linear_extrude(height = 686.1000000000) {
						polygon(paths = [[0, 1, 2, 3]], points = [[540, 1075], [540, 1245], [710, 1245], [710, 1075]]);
					}
				}
			}
			color(c = [0.1000000000, 0.1000000000, 0.1000000000]) {
				translate(v = [0, 0, 1490.0000000000]) {
					linear_extrude(height = 686.1000000000) {
						polygon(paths = [[0, 1, 2, 3]], points = [[1020, 1075], [1020, 1245], [1190, 1245], [1190, 1075]]);
					}
				}
			}
			color(c = [0.1000000000, 0.1000000000, 0.1000000000]) {
				translate(v = [0, 0, 1490.0000000000]) {
					linear_extrude(height = 686.1000000000) {
						polygon(paths = [[0, 1, 2, 3]], points = [[1530, 1075], [1530, 1245], [1700, 1245], [1700, 1075]]);
					}
				}
			}
			color(c = [0.1000000000, 0.1000000000, 0.1000000000]) {
				translate(v = [0, 0, 1490.0000000000]) {
					linear_extrude(height = 686.1000000000) {
						polygon(paths = [[0, 1, 2, 3]], points = [[2040, 1075], [2040, 1245], [2210, 1245], [2210, 1075]]);
					}
				}
			}
			color(c = [0.1000000000, 0.1000000000, 0.1000000000]) {
				translate(v = [0, 0, 1490.0000000000]) {
					linear_extrude(height = 686.1000000000) {
						polygon(paths = [[0, 1, 2, 3]], points = [[2780, 1075], [2780, 1245], [2950, 1245], [2950, 1075]]);
					}
				}
			}
			color(c = [0.1000000000, 0.1000000000, 0.1000000000]) {
				translate(v = [0, 0, 1490.0000000000]) {
					linear_extrude(height = 686.1000000000) {
						polygon(paths = [[0, 1, 2, 3]], points = [[175, 1575], [175, 1745], [345, 1745], [345, 1575]]);
					}
				}
			}
			color(c = [0.1000000000, 0.1000000000, 0.1000000000]) {
				translate(v = [0, 0, 1490.0000000000]) {
					linear_extrude(height = 686.1000000000) {
						polygon(paths = [[0, 1, 2, 3]], points = [[675, 1845], [675, 2015], [845, 2015], [845, 1845]]);
					}
				}
			}
			color(c = [0.1000000000, 0.1000000000, 0.1000000000]) {
				translate(v = [0, 0, 1490.0000000000]) {
					linear_extrude(height = 686.1000000000) {
						polygon(paths = [[0, 1, 2, 3]], points = [[1760, 1845], [1760, 2015], [1930, 2015], [1930, 1845]]);
					}
				}
			}
			color(c = [0.1000000000, 0.1000000000, 0.1000000000]) {
				translate(v = [0, 0, 1490.0000000000]) {
					linear_extrude(height = 686.1000000000) {
						polygon(paths = [[0, 1, 2, 3]], points = [[2765, 1845], [2765, 2015], [2935, 2015], [2935, 1845]]);
					}
				}
			}
			color(c = [0.1000000000, 0.1000000000, 0.1000000000]) {
				translate(v = [0, 0, 1490.0000000000]) {
					linear_extrude(height = 686.1000000000) {
						polygon(paths = [[0, 1, 2, 3]], points = [[175, 1915], [175, 2085], [345, 2085], [345, 1915]]);
					}
				}
			}
			color(c = [0.1000000000, 0.1000000000, 0.1000000000]) {
				translate(v = [0, 0, 1490.0000000000]) {
					linear_extrude(height = 686.1000000000) {
						polygon(paths = [[0, 1, 2, 3]], points = [[1200, 2195], [1200, 2365], [1370, 2365], [1370, 2195]]);
					}
				}
			}
			color(c = [0.1000000000, 0.1000000000, 0.1000000000]) {
				translate(v = [0, 0, 1490.0000000000]) {
					linear_extrude(height = 686.1000000000) {
						polygon(paths = [[0, 1, 2, 3]], points = [[2295, 2195], [2295, 2365], [2465, 2365], [2465, 2195]]);
					}
				}
			}
			color(c = [0.1000000000, 0.1000000000, 0.1000000000]) {
				translate(v = [0, 0, 1490.0000000000]) {
					linear_extrude(height = 686.1000000000) {
						polygon(paths = [[0, 1, 2, 3]], points = [[675, 2215], [675, 2385], [845, 2385], [845, 2215]]);
					}
				}
			}
			color(c = [0.1000000000, 0.1000000000, 0.1000000000]) {
				translate(v = [0, 0, 1490.0000000000]) {
					linear_extrude(height = 686.1000000000) {
						polygon(paths = [[0, 1, 2, 3]], points = [[1760, 2215], [1760, 2385], [1930, 2385], [1930, 2215]]);
					}
				}
			}
			color(c = [0.1000000000, 0.1000000000, 0.1000000000]) {
				translate(v = [0, 0, 1490.0000000000]) {
					linear_extrude(height = 686.1000000000) {
						polygon(paths = [[0, 1, 2, 3]], points = [[2765, 2215], [2765, 2385], [2935, 2385], [2935, 2215]]);
					}
				}
			}
			color(c = [0.1000000000, 0.1000000000, 0.1000000000]) {
				translate(v = [0, 0, 1490.0000000000]) {
					linear_extrude(height = 686.1000000000) {
						polygon(paths = [[0, 1, 2, 3]], points = [[175, 2255], [175, 2425], [345, 2425], [345, 2255]]);
					}
				}
			}
			color(c = [0.9000000000, 0.6000000000, 0.6000000000]) {
				translate(v = [0, 0, 2176.1000000000]) {
					linear_extrude(height = 100.0000000000) {
						polygon(paths = [[0, 1, 2, 3, 4, 5, 6, 7]], points = [[0, -85], [0, 85], [620, 85], [620, 445], [950, 445], [950, 85], [3220, 85], [3220, -85]]);
					}
				}
			}
			color(c = [0.9000000000, 0.6000000000, 0.6000000000]) {
				translate(v = [0, 0, 2176.1000000000]) {
					linear_extrude(height = 100.0000000000) {
						polygon(paths = [[0, 1, 2, 3]], points = [[2780, 995], [2780, 1615], [3085, 1615], [3085, 995]]);
					}
				}
			}
			color(c = [0.9000000000, 0.6000000000, 0.6000000000]) {
				translate(v = [0, 0, 2176.1000000000]) {
					linear_extrude(height = 100.0000000000) {
						polygon(paths = [[0, 1, 2, 3]], points = [[540, 965], [540, 1665], [780, 1665], [780, 965]]);
					}
				}
			}
			color(c = [0.9000000000, 0.6000000000, 0.6000000000]) {
				translate(v = [0, 0, 2176.1000000000]) {
					linear_extrude(height = 100.0000000000) {
						polygon(paths = [[0, 1, 2, 3]], points = [[960, 965], [960, 1665], [1250, 1665], [1250, 965]]);
					}
				}
			}
			color(c = [0.9000000000, 0.6000000000, 0.6000000000]) {
				translate(v = [0, 0, 2176.1000000000]) {
					linear_extrude(height = 100.0000000000) {
						polygon(paths = [[0, 1, 2, 3]], points = [[1470, 755], [1470, 1665], [1710, 1665], [1710, 755]]);
					}
				}
			}
			color(c = [0.9000000000, 0.6000000000, 0.6000000000]) {
				translate(v = [0, 0, 2176.1000000000]) {
					linear_extrude(height = 100.0000000000) {
						polygon(paths = [[0, 1, 2, 3]], points = [[1890, 755], [1890, 1665], [2210, 1665], [2210, 755]]);
					}
				}
			}
			color(c = [0.9000000000, 0.6000000000, 0.6000000000]) {
				translate(v = [0, 0, 2176.1000000000]) {
					linear_extrude(height = 100.0000000000) {
						polygon(paths = [[0, 1, 2, 3, 4, 5, 6, 7, 8, 9, 10, 11, 12, 13, 14, 15]], points = [[90, 285], [90, 2425], [425, 2425], [425, 1845], [360, 1845], [360, 785], [1290, 785], [1290, 465], [2685, 465], [2685, 805], [3015, 805], [3015, 295], [1120, 295], [1120, 615], [345, 615], [345, 285]]);
					}
				}
			}
			color(c = [0.9000000000, 0.6000000000, 0.6000000000]) {
				translate(v = [0, 0, 2176.1000000000]) {
					linear_extrude(height = 100.0000000000) {
						polygon(paths = [[0, 1, 2, 3, 4, 5, 6, 7, 8, 9, 10, 11]], points = [[595, 1845], [595, 2465], [845, 2465], [845, 2015], [1760, 2015], [1760, 2465], [1930, 2465], [1930, 2015], [2765, 2015], [2765, 2465], [3015, 2465], [3015, 1845]]);
					}
				}
			}
			color(c = [0.9000000000, 0.6000000000, 0.6000000000]) {
				translate(v = [0, 0, 2176.1000000000]) {
					linear_extrude(height = 100.0000000000) {
						polygon(paths = [[0, 1, 2, 3, 4, 5, 6, 7, 8, 9, 10, 11]], points = [[1120, 2195], [1120, 2635], [0, 2635], [0, 2805], [3220, 2805], [3220, 2635], [2545, 2635], [2545, 2195], [2215, 2195], [2215, 2635], [1450, 2635], [1450, 2195]]);
					}
				}
			}
			color(c = [0.5000000000, 0.5000000000, 0.5000000000]) {
				translate(v = [0, 0, 2276.1000000000]) {
					linear_extrude(height = 340.0000000000) {
						polygon(paths = [[0, 1, 2, 3]], points = [[145, -85], [145, 85], [315, 85], [315, -85]]);
					}
				}
			}
			color(c = [0.5000000000, 0.5000000000, 0.5000000000]) {
				translate(v = [0, 0, 2276.1000000000]) {
					linear_extrude(height = 340.0000000000) {
						polygon(paths = [[0, 1, 2, 3]], points = [[605, -85], [605, 85], [775, 85], [775, -85]]);
					}
				}
			}
			color(c = [0.5000000000, 0.5000000000, 0.5000000000]) {
				translate(v = [0, 0, 2276.1000000000]) {
					linear_extrude(height = 340.0000000000) {
						polygon(paths = [[0, 1, 2, 3]], points = [[1065, -85], [1065, 85], [1235, 85], [1235, -85]]);
					}
				}
			}
			color(c = [0.5000000000, 0.5000000000, 0.5000000000]) {
				translate(v = [0, 0, 2276.1000000000]) {
					linear_extrude(height = 340.0000000000) {
						polygon(paths = [[0, 1, 2, 3]], points = [[1525, -85], [1525, 85], [1695, 85], [1695, -85]]);
					}
				}
			}
			color(c = [0.5000000000, 0.5000000000, 0.5000000000]) {
				translate(v = [0, 0, 2276.1000000000]) {
					linear_extrude(height = 340.0000000000) {
						polygon(paths = [[0, 1, 2, 3]], points = [[1985, -85], [1985, 85], [2155, 85], [2155, -85]]);
					}
				}
			}
			color(c = [0.5000000000, 0.5000000000, 0.5000000000]) {
				translate(v = [0, 0, 2276.1000000000]) {
					linear_extrude(height = 340.0000000000) {
						polygon(paths = [[0, 1, 2, 3]], points = [[2445, -85], [2445, 85], [2615, 85], [2615, -85]]);
					}
				}
			}
			color(c = [0.5000000000, 0.5000000000, 0.5000000000]) {
				translate(v = [0, 0, 2276.1000000000]) {
					linear_extrude(height = 340.0000000000) {
						polygon(paths = [[0, 1, 2, 3]], points = [[2905, -85], [2905, 85], [3075, 85], [3075, -85]]);
					}
				}
			}
			color(c = [0.5000000000, 0.5000000000, 0.5000000000]) {
				translate(v = [0, 0, 2276.1000000000]) {
					linear_extrude(height = 340.0000000000) {
						polygon(paths = [[0, 1, 2, 3]], points = [[145, 2635], [145, 2805], [315, 2805], [315, 2635]]);
					}
				}
			}
			color(c = [0.5000000000, 0.5000000000, 0.5000000000]) {
				translate(v = [0, 0, 2276.1000000000]) {
					linear_extrude(height = 340.0000000000) {
						polygon(paths = [[0, 1, 2, 3]], points = [[605, 2635], [605, 2805], [775, 2805], [775, 2635]]);
					}
				}
			}
			color(c = [0.5000000000, 0.5000000000, 0.5000000000]) {
				translate(v = [0, 0, 2276.1000000000]) {
					linear_extrude(height = 340.0000000000) {
						polygon(paths = [[0, 1, 2, 3]], points = [[1065, 2635], [1065, 2805], [1235, 2805], [1235, 2635]]);
					}
				}
			}
			color(c = [0.5000000000, 0.5000000000, 0.5000000000]) {
				translate(v = [0, 0, 2276.1000000000]) {
					linear_extrude(height = 340.0000000000) {
						polygon(paths = [[0, 1, 2, 3]], points = [[1525, 2635], [1525, 2805], [1695, 2805], [1695, 2635]]);
					}
				}
			}
			color(c = [0.5000000000, 0.5000000000, 0.5000000000]) {
				translate(v = [0, 0, 2276.1000000000]) {
					linear_extrude(height = 340.0000000000) {
						polygon(paths = [[0, 1, 2, 3]], points = [[1985, 2635], [1985, 2805], [2155, 2805], [2155, 2635]]);
					}
				}
			}
			color(c = [0.5000000000, 0.5000000000, 0.5000000000]) {
				translate(v = [0, 0, 2276.1000000000]) {
					linear_extrude(height = 340.0000000000) {
						polygon(paths = [[0, 1, 2, 3]], points = [[2445, 2635], [2445, 2805], [2615, 2805], [2615, 2635]]);
					}
				}
			}
			color(c = [0.5000000000, 0.5000000000, 0.5000000000]) {
				translate(v = [0, 0, 2276.1000000000]) {
					linear_extrude(height = 340.0000000000) {
						polygon(paths = [[0, 1, 2, 3]], points = [[2905, 2635], [2905, 2805], [3075, 2805], [3075, 2635]]);
					}
				}
			}
			color(c = [0.3000000000, 0.3000000000, 1]) {
				translate(v = [0, 0, 2616.1000000000]) {
					linear_extrude(height = 360.0000000000) {
						polygon(paths = [[0, 1, 2, 3]], points = [[0, -240], [0, 240], [3220, 240], [3220, -240]]);
					}
				}
			}
			color(c = [0.3000000000, 0.3000000000, 1]) {
				translate(v = [0, 0, 2616.1000000000]) {
					linear_extrude(height = 360.0000000000) {
						polygon(paths = [[0, 1, 2, 3]], points = [[0, 2480], [0, 2960], [3220, 2960], [3220, 2480]]);
					}
				}
			}
		}
	}
}
